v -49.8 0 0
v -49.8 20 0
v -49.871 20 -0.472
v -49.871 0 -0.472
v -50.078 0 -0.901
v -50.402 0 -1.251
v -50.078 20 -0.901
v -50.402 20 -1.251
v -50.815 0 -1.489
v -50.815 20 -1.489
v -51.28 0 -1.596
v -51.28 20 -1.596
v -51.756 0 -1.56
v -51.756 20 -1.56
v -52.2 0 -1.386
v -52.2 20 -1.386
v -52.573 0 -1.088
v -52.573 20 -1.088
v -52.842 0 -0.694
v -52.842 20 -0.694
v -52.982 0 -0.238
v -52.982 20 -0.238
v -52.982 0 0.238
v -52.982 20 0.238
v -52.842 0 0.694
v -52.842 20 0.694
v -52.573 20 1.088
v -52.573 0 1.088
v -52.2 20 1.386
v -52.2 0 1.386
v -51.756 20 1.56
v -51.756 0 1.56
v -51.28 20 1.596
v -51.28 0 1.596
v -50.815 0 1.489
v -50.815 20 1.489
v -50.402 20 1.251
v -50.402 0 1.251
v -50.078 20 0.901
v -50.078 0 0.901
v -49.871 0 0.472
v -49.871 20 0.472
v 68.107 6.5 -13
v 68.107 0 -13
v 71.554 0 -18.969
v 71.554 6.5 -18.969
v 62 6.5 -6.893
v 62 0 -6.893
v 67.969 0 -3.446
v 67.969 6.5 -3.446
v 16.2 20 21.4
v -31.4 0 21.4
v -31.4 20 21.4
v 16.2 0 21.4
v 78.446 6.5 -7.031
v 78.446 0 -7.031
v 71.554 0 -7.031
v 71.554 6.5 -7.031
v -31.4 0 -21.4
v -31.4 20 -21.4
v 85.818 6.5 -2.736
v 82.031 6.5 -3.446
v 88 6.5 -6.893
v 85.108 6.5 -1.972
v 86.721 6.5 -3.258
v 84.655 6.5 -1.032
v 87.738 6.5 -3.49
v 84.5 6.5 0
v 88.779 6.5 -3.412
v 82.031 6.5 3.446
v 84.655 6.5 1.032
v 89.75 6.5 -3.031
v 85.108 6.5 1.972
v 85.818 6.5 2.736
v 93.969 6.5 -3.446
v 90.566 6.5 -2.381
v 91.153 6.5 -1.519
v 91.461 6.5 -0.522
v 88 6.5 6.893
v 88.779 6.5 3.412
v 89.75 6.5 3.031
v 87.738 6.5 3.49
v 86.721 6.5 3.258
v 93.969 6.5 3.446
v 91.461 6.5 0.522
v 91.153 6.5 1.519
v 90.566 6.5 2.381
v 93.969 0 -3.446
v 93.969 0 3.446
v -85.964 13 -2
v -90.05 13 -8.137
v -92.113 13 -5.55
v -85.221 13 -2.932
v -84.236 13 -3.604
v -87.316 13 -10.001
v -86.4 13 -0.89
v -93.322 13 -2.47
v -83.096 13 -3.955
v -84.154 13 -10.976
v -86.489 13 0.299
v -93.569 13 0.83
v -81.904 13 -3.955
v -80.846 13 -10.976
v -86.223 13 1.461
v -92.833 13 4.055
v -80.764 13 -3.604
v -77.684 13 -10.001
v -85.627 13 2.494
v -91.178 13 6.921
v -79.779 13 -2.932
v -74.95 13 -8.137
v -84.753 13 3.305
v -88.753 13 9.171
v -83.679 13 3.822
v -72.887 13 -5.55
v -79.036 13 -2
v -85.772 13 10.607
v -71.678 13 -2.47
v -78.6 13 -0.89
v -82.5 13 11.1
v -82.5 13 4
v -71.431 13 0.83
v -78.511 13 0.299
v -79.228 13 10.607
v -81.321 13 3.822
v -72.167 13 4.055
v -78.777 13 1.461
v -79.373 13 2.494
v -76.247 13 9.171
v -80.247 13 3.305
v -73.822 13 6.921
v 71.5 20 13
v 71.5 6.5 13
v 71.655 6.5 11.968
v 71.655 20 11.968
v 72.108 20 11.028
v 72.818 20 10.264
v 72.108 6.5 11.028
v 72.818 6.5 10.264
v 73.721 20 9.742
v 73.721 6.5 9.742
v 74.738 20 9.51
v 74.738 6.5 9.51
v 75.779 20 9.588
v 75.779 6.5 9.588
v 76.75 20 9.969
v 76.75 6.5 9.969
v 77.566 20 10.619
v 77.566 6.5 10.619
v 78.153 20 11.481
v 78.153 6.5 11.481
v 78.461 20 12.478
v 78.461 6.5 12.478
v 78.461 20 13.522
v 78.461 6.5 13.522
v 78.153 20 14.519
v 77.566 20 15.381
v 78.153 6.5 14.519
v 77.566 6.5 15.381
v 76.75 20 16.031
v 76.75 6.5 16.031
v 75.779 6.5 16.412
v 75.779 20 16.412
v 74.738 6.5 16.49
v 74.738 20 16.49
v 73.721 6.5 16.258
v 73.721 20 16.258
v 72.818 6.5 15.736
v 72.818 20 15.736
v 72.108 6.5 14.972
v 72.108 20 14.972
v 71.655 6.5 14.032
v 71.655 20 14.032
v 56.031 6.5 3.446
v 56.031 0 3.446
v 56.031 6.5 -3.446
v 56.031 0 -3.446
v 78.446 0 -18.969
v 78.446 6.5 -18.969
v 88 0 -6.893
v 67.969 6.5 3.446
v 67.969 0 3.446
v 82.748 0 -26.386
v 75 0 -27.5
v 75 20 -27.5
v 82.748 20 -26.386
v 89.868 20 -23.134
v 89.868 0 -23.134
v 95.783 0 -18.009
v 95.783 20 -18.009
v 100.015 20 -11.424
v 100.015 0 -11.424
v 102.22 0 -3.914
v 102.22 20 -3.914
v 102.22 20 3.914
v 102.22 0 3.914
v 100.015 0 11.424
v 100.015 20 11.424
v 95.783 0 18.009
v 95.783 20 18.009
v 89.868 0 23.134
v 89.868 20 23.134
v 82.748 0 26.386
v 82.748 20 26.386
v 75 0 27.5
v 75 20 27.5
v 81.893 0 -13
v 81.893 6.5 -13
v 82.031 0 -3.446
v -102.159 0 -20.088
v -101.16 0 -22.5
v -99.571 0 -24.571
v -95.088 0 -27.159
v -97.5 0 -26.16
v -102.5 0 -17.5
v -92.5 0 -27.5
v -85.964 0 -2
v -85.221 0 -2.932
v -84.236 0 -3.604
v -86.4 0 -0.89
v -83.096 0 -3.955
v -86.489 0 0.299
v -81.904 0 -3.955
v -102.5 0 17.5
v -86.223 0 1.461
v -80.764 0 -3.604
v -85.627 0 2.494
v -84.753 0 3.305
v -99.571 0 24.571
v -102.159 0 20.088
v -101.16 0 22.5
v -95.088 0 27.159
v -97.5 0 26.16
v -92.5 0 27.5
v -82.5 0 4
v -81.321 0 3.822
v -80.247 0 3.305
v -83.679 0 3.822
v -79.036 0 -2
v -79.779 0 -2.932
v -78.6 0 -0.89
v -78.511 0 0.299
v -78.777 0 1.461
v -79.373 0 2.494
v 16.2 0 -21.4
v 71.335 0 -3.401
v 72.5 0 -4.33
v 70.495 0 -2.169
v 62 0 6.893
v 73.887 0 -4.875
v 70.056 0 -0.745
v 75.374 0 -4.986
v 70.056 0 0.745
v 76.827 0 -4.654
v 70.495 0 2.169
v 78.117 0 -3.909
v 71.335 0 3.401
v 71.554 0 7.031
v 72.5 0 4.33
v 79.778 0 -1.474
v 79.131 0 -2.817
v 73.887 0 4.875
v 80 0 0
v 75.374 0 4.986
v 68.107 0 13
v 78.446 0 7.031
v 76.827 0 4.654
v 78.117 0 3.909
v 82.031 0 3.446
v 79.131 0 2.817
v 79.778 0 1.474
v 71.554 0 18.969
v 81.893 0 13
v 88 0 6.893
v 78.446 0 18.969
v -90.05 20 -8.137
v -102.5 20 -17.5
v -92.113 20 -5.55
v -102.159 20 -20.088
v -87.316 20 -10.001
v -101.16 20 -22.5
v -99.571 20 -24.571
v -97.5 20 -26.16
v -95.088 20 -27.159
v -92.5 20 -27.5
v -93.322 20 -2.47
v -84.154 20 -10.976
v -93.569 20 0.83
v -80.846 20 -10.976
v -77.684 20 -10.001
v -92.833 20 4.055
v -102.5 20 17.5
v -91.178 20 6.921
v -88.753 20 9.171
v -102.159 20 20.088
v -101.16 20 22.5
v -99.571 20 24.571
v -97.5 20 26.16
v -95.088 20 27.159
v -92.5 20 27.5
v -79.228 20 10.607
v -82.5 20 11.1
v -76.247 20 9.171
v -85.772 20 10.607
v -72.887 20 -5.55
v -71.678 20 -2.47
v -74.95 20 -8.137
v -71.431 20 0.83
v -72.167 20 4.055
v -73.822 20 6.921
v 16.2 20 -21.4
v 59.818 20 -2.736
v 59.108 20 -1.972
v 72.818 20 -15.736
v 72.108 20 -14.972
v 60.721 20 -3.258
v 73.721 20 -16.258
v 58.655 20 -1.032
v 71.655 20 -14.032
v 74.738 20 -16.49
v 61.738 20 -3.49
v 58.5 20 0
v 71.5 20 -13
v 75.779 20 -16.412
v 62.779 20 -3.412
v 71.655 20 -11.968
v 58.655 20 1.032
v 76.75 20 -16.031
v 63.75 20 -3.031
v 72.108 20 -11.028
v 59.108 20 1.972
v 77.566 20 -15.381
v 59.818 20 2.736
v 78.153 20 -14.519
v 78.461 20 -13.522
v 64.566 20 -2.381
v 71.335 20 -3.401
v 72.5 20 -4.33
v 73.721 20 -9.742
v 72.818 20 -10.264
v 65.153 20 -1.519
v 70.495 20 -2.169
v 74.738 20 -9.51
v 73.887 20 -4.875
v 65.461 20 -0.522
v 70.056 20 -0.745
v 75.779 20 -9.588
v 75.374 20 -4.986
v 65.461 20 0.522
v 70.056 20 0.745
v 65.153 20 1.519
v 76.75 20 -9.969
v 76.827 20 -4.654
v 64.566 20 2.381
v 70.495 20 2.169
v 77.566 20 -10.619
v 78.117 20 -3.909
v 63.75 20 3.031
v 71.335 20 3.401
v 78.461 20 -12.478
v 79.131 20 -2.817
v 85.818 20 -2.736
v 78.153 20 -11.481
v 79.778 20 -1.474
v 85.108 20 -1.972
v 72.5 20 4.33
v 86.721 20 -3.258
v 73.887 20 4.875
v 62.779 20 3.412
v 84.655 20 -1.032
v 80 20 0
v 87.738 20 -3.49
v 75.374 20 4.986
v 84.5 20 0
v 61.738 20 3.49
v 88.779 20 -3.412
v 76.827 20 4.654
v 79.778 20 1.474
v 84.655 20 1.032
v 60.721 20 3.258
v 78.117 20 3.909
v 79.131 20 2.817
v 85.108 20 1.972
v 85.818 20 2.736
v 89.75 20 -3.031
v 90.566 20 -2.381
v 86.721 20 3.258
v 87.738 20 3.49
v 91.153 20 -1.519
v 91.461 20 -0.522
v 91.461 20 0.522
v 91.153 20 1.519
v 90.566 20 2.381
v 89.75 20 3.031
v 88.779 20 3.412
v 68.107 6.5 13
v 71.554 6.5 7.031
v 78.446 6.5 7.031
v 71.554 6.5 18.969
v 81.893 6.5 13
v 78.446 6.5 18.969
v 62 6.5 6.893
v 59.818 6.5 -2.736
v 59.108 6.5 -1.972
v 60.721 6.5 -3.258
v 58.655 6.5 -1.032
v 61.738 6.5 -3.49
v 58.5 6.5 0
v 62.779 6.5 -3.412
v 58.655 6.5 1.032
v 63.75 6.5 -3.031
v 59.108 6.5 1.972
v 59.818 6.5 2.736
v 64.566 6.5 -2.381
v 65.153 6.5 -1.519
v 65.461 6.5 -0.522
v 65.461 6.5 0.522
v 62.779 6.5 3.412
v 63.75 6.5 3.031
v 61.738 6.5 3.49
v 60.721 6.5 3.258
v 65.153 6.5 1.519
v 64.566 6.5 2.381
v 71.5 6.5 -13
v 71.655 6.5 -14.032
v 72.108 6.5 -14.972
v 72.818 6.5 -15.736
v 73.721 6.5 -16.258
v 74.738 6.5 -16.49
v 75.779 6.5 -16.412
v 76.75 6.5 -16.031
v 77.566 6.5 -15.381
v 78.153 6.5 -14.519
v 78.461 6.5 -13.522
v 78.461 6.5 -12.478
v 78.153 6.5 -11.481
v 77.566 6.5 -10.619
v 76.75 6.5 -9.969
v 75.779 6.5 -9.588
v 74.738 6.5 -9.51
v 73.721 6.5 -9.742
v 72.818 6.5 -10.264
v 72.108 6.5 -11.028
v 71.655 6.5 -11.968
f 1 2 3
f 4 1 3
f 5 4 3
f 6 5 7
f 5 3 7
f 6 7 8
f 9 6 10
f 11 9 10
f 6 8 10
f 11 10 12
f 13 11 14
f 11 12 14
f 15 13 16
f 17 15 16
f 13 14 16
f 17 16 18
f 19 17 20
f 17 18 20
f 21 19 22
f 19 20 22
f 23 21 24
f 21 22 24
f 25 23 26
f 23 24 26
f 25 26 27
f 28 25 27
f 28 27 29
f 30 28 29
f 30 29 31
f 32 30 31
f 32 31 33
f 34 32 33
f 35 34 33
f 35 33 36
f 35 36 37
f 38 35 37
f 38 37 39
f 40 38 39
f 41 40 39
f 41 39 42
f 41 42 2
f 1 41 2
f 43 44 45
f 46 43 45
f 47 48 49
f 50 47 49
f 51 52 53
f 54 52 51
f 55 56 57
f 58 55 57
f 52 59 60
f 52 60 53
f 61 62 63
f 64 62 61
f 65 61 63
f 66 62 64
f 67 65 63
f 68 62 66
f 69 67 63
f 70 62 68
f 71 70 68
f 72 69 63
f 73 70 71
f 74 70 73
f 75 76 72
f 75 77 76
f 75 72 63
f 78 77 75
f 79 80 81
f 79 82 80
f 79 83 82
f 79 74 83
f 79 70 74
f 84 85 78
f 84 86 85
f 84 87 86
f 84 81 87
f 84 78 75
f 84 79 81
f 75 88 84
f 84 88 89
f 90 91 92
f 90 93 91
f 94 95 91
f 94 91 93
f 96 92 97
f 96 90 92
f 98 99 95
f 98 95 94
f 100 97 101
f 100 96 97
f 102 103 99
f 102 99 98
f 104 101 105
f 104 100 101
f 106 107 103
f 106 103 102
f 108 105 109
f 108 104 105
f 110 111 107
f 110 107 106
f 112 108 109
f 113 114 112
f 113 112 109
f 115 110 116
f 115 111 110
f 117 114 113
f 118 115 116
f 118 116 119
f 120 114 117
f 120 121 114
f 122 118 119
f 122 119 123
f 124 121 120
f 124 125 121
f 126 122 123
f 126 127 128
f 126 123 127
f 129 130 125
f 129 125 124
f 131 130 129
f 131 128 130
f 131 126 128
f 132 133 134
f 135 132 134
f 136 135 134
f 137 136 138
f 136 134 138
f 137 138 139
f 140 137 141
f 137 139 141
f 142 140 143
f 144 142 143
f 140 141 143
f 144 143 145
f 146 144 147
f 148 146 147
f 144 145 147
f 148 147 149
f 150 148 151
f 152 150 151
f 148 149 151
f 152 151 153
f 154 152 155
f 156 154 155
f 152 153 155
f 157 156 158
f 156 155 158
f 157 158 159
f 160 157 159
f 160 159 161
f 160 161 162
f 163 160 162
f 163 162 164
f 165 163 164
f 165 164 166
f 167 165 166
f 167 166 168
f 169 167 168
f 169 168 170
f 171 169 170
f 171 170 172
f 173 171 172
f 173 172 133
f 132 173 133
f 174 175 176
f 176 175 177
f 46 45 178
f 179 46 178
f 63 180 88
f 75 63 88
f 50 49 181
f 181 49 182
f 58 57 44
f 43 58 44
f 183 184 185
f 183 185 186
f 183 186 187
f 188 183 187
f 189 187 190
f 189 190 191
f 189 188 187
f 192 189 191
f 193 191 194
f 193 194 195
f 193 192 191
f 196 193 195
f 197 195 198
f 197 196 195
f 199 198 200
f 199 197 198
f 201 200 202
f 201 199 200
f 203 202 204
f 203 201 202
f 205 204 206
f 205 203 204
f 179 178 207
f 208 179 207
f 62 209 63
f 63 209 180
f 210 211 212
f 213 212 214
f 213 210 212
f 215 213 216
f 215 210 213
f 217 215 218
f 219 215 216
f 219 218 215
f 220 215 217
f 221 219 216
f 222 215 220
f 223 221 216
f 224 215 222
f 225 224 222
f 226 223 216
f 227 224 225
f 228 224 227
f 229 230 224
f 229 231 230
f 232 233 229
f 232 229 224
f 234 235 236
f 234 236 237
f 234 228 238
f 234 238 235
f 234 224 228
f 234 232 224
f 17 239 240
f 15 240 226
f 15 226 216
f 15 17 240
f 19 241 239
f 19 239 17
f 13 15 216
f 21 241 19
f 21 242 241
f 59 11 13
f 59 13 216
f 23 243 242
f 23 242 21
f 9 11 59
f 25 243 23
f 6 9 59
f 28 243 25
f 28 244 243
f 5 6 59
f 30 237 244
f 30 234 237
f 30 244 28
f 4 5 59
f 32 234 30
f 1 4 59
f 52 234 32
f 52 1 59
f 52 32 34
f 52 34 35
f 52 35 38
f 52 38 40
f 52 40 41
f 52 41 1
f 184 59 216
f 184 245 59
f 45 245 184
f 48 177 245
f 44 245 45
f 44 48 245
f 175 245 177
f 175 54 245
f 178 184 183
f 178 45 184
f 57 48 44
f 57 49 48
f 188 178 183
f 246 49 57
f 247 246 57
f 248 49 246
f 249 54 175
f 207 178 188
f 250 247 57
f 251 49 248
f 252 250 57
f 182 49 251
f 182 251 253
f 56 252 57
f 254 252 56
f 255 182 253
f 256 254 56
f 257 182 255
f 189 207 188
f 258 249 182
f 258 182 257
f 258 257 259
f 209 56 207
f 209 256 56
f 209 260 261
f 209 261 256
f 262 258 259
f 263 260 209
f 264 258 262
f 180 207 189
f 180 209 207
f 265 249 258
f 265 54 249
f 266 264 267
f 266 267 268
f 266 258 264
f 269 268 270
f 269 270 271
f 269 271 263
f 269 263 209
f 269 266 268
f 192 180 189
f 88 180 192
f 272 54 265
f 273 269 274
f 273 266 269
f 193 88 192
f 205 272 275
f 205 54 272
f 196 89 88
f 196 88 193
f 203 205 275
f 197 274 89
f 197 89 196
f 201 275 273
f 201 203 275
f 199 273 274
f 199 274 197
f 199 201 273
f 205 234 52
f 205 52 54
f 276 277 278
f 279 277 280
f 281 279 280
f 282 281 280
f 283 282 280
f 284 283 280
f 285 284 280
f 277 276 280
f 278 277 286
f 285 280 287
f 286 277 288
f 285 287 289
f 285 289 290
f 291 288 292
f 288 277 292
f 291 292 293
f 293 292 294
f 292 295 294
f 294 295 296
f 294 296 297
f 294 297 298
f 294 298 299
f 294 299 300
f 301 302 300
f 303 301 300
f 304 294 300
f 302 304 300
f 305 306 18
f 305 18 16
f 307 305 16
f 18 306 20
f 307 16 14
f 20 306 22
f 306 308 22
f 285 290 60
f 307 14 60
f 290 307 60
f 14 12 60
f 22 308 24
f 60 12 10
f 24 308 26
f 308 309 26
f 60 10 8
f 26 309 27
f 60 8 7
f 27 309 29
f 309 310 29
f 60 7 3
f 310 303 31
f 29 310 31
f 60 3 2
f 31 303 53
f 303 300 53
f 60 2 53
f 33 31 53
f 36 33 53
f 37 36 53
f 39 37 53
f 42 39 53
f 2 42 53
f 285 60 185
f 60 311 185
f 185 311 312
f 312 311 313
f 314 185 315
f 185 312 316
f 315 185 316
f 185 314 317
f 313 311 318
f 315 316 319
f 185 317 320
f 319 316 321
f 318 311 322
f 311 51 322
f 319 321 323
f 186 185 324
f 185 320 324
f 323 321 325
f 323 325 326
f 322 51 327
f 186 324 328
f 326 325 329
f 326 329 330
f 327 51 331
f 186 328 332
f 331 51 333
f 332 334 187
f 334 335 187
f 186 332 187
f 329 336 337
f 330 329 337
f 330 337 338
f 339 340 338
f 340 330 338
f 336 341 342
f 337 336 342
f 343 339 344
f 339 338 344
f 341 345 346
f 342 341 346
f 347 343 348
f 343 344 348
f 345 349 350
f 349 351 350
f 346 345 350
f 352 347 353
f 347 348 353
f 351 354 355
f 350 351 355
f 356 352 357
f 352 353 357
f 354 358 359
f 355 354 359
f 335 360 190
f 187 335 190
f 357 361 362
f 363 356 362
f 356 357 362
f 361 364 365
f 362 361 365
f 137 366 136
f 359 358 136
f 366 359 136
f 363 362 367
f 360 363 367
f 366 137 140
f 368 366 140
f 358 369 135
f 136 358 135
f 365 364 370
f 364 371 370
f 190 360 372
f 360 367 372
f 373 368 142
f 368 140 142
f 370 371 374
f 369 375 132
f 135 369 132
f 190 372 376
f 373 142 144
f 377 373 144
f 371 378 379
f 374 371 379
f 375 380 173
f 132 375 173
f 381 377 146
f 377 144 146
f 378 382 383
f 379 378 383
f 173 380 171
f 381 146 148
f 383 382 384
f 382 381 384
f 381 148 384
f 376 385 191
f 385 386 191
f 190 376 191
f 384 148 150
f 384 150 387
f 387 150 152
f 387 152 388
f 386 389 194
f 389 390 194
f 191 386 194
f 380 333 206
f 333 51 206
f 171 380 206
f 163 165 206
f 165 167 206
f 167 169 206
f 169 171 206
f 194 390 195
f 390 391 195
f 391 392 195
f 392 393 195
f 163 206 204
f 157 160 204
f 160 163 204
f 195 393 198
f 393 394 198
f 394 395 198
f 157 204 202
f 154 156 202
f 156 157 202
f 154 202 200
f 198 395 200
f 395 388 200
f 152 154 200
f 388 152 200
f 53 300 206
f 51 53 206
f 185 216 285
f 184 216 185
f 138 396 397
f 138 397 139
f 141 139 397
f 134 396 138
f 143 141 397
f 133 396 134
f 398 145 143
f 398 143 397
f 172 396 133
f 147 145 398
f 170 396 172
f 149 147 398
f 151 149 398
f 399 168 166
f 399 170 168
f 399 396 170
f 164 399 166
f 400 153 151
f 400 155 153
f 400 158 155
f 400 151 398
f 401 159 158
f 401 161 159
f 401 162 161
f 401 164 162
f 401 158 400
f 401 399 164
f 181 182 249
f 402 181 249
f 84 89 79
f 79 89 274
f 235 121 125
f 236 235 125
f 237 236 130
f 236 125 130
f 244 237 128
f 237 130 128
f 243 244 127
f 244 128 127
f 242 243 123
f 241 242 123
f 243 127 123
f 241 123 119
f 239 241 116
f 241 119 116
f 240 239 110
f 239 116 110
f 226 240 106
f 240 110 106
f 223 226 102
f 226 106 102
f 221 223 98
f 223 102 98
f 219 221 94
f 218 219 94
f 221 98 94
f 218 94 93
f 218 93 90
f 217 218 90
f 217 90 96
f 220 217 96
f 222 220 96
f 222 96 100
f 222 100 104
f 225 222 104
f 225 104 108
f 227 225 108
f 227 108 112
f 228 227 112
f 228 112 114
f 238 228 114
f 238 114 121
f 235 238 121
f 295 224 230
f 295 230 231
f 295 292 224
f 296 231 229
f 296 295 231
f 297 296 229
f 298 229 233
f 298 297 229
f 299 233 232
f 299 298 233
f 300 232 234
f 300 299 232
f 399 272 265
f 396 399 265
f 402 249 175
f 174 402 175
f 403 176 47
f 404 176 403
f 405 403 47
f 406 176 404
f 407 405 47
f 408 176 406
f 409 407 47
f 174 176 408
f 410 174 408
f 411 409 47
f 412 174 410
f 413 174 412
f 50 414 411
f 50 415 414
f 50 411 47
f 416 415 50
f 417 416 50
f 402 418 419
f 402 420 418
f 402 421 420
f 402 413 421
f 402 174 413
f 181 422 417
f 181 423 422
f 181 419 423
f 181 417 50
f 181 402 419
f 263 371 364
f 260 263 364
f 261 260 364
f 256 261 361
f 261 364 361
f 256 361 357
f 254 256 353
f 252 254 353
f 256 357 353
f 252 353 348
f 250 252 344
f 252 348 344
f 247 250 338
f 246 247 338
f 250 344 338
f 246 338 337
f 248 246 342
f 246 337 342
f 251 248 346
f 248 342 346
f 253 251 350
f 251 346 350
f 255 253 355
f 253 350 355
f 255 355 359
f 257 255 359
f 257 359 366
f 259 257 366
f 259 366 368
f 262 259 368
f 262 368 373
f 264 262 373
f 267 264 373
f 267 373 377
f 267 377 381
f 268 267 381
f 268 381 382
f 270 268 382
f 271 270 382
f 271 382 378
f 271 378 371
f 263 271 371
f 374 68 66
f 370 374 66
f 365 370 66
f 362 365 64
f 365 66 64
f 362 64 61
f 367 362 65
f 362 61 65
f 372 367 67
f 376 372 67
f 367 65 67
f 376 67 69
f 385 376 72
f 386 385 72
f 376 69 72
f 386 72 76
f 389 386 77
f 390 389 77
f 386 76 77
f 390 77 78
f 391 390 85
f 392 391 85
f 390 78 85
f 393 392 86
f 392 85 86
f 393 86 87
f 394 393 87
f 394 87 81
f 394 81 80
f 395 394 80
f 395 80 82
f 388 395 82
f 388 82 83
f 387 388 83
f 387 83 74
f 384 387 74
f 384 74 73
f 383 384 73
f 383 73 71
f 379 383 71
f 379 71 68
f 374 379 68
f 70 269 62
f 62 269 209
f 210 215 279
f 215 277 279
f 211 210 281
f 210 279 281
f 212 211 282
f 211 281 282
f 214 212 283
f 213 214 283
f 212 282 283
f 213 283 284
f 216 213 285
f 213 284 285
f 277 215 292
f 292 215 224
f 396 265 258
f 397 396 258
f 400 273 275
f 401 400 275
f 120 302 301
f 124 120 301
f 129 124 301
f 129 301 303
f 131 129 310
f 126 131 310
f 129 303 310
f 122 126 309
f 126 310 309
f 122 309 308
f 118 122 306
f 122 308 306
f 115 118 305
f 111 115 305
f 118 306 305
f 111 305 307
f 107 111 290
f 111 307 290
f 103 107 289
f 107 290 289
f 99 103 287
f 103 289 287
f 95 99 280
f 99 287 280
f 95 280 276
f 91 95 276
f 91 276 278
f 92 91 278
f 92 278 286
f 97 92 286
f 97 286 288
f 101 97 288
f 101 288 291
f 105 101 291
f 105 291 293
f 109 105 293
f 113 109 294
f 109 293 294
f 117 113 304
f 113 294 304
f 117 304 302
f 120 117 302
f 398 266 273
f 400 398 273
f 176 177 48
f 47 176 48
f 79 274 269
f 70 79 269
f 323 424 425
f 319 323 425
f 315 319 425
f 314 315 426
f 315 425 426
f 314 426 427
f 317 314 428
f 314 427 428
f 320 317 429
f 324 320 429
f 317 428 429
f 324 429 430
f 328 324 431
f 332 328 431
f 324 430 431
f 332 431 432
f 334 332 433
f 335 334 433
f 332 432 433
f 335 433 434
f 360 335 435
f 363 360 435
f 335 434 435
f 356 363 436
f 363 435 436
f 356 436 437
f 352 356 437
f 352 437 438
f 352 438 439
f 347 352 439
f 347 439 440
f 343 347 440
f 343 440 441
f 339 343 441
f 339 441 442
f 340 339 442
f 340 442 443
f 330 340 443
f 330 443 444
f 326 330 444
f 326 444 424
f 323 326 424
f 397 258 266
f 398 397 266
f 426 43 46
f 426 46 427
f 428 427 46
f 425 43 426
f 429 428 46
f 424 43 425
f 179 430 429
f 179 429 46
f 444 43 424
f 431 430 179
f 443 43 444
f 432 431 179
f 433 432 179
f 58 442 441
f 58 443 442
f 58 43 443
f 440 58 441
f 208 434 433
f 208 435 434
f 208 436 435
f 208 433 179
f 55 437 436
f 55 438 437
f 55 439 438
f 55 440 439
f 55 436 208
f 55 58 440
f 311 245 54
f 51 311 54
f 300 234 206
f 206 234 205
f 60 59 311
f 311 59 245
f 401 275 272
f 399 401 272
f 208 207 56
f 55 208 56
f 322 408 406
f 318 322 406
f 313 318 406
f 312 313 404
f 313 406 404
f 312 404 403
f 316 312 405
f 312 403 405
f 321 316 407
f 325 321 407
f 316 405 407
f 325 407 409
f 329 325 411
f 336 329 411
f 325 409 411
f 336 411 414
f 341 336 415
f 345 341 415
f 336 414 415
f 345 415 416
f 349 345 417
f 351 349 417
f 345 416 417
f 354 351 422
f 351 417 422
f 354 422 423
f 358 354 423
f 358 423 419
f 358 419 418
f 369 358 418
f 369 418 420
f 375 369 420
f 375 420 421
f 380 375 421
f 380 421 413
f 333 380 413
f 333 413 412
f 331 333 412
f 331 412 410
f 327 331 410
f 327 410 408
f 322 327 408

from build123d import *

# Parameters (mm, degrees)
SKETCH1_W             = 150
SKETCH1_H             = 55
BOSS_EXTRUDE1_DEPTH   = 20
SKETCH2_W             = 27.5
SKETCH2_H             = 55
BOSS_EXTRUDE2_DEPTH   = 20
M8_CLEARANCE_HOLE1_D  = 10
M6_CLEARANCE_HOLE1_D  = 7
FILLET1_R             = 10
SKETCH11_W            = 42.4
SKETCH11_H            = 42.4
CUT_EXTRUDE1_DEPTH    = 108.993055332
SKETCH12_R            = 4
CUT_EXTRUDE2_DEPTH    = 108.993055332
SKETCH13_W            = 47.6
SKETCH13_H            = 42.8
CUT_EXTRUDE3_DEPTH    = 108.993055332
CUT_EXTRUDE4_DEPTH    = 6.5
SKETCH15_R            = 11.1
CUT_EXTRUDE5_DEPTH    = 7
F_3_0MM_DOWEL_HOLE1_D = 3.2


with BuildPart() as part:
    # Sketch1 → Boss-Extrude1 (new body)
    with BuildSketch(Plane(origin=(0, 0, 0), x_dir=(1, 0, 0), z_dir=(0, 1, 0))):
        Rectangle(SKETCH1_W, SKETCH1_H)
    extrude(amount=BOSS_EXTRUDE1_DEPTH)

    # Sketch2 → Boss-Extrude2 (add)
    with BuildSketch(Plane.XZ):
        with Locations((-88.75, 0)):
            Rectangle(SKETCH2_W, SKETCH2_H)
        with BuildLine():
            Line((75, 27.5), (75, -27.5))
            ThreePointArc((75, -27.5), (102.5, 0), (75, 27.5))
        make_face()
    extrude(amount=-BOSS_EXTRUDE2_DEPTH)

    # M8 Clearance Hole1 (through all)
    with Locations(Plane(origin=(0, 0, 0), x_dir=(-1, 0, 0), z_dir=(0, -1, 0))):
        with Locations((-75, 0)):
            Hole(M8_CLEARANCE_HOLE1_D / 2)

    # M6 Clearance Hole1 (through all)
    with Locations(Plane(origin=(0, 20, 0), x_dir=(1, 0, 0), z_dir=(0, 1, 0))):
        with Locations((75, 13), (62, 0), (88, 0), (75, -13)):
            Hole(M6_CLEARANCE_HOLE1_D / 2)

    # Fillet1
    fillet1_edges = [part.edges().sort_by_distance(p)[0] for p in [
        (-102.5, 10, -27.5),
        (-102.5, 10, 27.5),
    ]]
    fillet(fillet1_edges, radius=FILLET1_R)

    # Sketch11 → Cut-Extrude1 (cut, through all)
    with BuildSketch(Plane.XZ):
        with Locations((-10, 0)):
            Rectangle(SKETCH11_W, SKETCH11_H)
    extrude(amount=-CUT_EXTRUDE1_DEPTH, mode=Mode.SUBTRACT)

    # Sketch12 → Cut-Extrude2 (cut, through all)
    with BuildSketch(Plane(origin=(0, 20, 0), x_dir=(1, 0, 0), z_dir=(0, 1, 0))):
        with Locations(Location((-82.5, 0, 0), (0, 0, 270))):
            Circle(SKETCH12_R)
    extrude(amount=-CUT_EXTRUDE2_DEPTH, mode=Mode.SUBTRACT)

    # Sketch13 → Cut-Extrude3 (cut, through all)
    with BuildSketch(Plane.XZ):
        with Locations((-7.6, 0)):
            Rectangle(SKETCH13_W, SKETCH13_H)
    extrude(amount=-CUT_EXTRUDE3_DEPTH, mode=Mode.SUBTRACT)

    # Sketch14 → Cut-Extrude4 (cut)
    with BuildSketch(Plane.XZ):
        Polygon((93.969119661, 3.446272843), (88, 6.892545686), (82.030880339, 3.446272843), (82.030880339, -3.446272843), (88, -6.892545686), (93.969119661, -3.446272843), align=None)
        Polygon((71.553727157, 18.969119661), (68.107454314, 13), (71.553727157, 7.030880339), (78.446272843, 7.030880339), (81.892545686, 13), (78.446272843, 18.969119661), align=None)
        Polygon((78.446272843, -18.969119661), (81.892545686, -13), (78.446272843, -7.030880339), (71.553727157, -7.030880339), (68.107454314, -13), (71.553727157, -18.969119661), align=None)
        Polygon((56.030880339, -3.446272843), (62, -6.892545686), (67.969119661, -3.446272843), (67.969119661, 3.446272843), (62, 6.892545686), (56.030880339, 3.446272843), align=None)
    extrude(amount=-CUT_EXTRUDE4_DEPTH, mode=Mode.SUBTRACT)

    # Sketch15 → Cut-Extrude5 (cut)
    with BuildSketch(Plane(origin=(0, 20, 0), x_dir=(1, 0, 0), z_dir=(0, 1, 0))):
        with Locations(Location((-82.5, 0, 0), (0, 0, 270))):
            Circle(SKETCH15_R)
    extrude(amount=-CUT_EXTRUDE5_DEPTH, mode=Mode.SUBTRACT)

    # Ø3.0mm Dowel Hole1 (through all)
    with Locations(Plane(origin=(0, 0, 0), x_dir=(-1, 0, 0), z_dir=(0, -1, 0))):
        with Locations((51.4, 0)):
            Hole(F_3_0MM_DOWEL_HOLE1_D / 2)


solid = part.part
